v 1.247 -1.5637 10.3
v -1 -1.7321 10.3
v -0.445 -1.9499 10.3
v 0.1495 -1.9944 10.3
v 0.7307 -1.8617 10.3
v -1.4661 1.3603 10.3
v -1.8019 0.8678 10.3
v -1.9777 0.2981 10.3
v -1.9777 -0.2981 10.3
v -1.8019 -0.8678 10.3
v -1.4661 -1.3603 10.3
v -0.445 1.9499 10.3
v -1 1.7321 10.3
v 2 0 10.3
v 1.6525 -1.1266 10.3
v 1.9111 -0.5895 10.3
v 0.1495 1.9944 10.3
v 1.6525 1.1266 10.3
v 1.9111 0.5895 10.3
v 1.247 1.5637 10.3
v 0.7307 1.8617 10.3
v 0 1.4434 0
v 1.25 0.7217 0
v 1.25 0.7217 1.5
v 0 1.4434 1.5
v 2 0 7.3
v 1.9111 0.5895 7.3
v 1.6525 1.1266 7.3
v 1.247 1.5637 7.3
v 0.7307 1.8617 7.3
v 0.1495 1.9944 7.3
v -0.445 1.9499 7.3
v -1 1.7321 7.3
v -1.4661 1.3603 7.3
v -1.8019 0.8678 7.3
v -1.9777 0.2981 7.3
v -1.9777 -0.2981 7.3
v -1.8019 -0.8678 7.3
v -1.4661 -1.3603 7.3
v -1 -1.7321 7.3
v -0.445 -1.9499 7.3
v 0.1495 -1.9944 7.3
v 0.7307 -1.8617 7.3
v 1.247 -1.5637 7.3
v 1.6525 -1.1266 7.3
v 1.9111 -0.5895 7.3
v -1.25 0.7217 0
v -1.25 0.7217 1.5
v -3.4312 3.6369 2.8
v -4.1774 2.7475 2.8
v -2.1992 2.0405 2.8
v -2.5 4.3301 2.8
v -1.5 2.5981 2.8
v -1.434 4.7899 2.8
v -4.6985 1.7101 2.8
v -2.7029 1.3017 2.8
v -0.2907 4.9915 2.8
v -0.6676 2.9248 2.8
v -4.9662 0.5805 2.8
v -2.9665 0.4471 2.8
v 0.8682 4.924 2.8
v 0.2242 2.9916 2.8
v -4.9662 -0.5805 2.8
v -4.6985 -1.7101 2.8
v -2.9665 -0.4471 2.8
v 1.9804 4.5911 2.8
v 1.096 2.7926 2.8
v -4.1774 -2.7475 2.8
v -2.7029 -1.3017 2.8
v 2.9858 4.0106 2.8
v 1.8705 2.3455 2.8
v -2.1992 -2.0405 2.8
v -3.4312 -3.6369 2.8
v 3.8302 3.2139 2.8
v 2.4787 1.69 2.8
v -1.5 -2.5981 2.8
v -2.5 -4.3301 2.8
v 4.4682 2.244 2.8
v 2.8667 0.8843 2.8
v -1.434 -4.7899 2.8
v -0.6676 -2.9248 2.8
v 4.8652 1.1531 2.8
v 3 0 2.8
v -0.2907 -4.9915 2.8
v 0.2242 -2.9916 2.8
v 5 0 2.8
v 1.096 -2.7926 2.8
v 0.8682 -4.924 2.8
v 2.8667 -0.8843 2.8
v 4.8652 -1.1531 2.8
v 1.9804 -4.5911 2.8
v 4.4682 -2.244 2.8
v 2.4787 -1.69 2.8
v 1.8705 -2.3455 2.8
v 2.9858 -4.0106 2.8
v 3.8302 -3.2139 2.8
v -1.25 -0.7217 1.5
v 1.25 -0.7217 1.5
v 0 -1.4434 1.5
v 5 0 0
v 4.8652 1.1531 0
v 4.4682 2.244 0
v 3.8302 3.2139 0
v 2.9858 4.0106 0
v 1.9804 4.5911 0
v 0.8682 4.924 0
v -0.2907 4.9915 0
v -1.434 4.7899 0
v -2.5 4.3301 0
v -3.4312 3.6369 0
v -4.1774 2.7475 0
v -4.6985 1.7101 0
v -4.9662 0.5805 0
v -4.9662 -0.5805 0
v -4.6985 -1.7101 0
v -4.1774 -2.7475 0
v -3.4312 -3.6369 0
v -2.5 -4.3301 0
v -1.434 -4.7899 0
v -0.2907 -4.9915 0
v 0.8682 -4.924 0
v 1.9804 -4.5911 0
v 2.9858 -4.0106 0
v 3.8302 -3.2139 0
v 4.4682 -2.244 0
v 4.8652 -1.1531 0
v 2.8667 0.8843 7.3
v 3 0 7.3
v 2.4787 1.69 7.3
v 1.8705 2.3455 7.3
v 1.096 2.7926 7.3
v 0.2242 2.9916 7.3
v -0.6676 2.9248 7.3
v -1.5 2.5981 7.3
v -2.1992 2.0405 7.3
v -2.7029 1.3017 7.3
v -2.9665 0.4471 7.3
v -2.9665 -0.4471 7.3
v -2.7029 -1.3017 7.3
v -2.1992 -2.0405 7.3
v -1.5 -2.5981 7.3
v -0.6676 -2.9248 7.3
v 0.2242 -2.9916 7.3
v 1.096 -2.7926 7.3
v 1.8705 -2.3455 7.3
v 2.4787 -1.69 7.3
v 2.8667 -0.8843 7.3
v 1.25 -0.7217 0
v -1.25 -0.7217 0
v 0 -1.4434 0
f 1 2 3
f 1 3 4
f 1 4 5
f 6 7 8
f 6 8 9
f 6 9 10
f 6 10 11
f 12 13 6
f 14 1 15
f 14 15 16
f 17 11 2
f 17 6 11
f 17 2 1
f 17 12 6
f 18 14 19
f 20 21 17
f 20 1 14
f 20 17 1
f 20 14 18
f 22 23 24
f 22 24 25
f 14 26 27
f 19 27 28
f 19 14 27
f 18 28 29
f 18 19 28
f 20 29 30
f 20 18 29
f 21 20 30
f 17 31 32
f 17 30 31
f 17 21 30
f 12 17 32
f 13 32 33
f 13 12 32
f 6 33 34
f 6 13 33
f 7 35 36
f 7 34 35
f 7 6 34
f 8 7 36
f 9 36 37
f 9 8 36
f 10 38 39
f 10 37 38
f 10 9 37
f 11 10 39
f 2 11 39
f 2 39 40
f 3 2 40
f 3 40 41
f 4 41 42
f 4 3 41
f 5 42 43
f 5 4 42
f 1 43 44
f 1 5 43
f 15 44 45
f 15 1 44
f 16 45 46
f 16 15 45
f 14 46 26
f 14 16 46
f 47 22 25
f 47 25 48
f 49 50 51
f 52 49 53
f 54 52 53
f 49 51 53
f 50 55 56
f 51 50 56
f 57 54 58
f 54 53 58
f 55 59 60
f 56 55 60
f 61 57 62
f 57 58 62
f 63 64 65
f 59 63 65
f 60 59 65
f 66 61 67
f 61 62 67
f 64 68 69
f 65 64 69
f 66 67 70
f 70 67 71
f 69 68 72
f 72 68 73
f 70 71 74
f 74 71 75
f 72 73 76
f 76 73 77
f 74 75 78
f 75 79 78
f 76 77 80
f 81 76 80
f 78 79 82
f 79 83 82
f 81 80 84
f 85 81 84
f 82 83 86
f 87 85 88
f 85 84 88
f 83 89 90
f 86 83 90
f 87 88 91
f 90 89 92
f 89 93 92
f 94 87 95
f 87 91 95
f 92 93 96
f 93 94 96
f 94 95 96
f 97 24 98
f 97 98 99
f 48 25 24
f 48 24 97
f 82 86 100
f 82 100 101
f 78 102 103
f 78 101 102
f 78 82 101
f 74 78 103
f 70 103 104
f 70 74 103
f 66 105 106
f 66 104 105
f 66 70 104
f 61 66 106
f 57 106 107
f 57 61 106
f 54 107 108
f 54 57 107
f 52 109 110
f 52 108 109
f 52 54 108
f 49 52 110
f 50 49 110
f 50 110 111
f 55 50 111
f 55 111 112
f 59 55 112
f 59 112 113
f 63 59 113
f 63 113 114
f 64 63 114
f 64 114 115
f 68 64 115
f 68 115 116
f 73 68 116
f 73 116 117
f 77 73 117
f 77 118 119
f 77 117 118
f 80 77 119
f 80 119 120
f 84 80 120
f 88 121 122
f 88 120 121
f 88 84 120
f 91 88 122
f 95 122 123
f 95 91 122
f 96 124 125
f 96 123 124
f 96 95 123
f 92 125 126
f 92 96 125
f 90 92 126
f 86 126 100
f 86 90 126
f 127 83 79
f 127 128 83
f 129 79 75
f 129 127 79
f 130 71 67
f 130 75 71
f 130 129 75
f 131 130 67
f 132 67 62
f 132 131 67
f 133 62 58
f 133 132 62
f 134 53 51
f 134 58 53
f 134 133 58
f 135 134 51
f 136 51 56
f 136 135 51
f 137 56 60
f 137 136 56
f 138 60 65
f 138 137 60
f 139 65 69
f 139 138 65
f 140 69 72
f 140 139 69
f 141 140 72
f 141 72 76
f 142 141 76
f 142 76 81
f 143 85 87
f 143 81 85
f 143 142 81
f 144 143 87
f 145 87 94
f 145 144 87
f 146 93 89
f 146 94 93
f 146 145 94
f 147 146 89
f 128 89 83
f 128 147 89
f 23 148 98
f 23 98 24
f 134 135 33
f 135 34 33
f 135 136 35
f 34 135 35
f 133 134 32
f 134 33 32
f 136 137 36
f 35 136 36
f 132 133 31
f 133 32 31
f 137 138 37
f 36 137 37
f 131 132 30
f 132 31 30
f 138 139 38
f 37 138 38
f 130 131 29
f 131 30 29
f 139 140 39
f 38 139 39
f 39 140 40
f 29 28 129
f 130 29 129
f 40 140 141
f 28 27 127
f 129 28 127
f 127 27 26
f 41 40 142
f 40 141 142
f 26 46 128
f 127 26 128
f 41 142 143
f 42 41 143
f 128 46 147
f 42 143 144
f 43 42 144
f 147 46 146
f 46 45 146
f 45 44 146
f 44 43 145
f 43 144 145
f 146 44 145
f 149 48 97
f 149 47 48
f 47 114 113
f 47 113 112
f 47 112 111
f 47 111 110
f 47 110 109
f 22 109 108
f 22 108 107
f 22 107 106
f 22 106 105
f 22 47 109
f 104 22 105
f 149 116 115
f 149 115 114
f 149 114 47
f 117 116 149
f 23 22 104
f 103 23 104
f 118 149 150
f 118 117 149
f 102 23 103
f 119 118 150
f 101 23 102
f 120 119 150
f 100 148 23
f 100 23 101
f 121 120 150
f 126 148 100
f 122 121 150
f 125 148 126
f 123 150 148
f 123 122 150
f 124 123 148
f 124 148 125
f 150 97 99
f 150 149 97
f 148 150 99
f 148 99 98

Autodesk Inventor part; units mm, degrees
ref_plane "YZ Plane" through (0, 0, 0) normal (1, 0, 0) x (0, 1, 0)
ref_plane "XZ Plane" through (0, 0, 0) normal (0, 1, 0) x (-1, 0, 0)
ref_plane "XY Plane" through (0, 0, 0) normal (0, 0, 1) x (1, 0, 0)
sketch "スケッチ1" plane through (0, 0, 0) normal (0, 1, 0) x (-1, 0, 0)
  line L0 (0, 0) -> (-5, 0)
  line L1 (-5, 0) -> (-5, 2.8)
  line L2 (-5, 2.8) -> (-3, 2.8)
  line L3 (-3, 2.8) -> (-3, 7.3)
  line L4 (-3, 7.3) -> (-2, 7.3)
  line L5 (-2, 7.3) -> (-2, 11.87)
  line L6 (-1.57, 12.3) -> (0, 12.3)
  line L7 (0, 12.3) -> (0, 0)
  line L8 (-1.57, 12.3) -> (-2, 11.87)
  point P0 (-2, 12.3)
  dimension "d0" = 5
  dimension "d1" = 4.5
  dimension "d2" = 2.8
  dimension "d3" = 0.43
  dimension "d4" = 0.43
  dimension "d5" = 4
  dimension "d6" = 10
  dimension "d7" = 6
revolve "回転1" add sketch "スケッチ1" angle 360 about axis through (0, 0, 12.3) along (0, 0, -1)
thread "ねじ1" size "M4x0.7" class "6g" standard "ANSI Metric M Profile" length 7.57 offset 1.2
sketch "スケッチ2" plane through (0, 0, 0) normal (0, 0, -1) x (-1, 0, 0)
  line L0 (0, -1.4434) -> (-1.25, -0.7217)
  line L1 (-1.25, -0.7217) -> (-1.25, 0.7217)
  line L2 (-1.25, 0.7217) -> (0, 1.4434)
  line L3 (0, 1.4434) -> (1.25, 0.7217)
  line L4 (1.25, 0.7217) -> (1.25, -0.7217)
  line L5 (1.25, -0.7217) -> (0, -1.4434)
  point P0 (0, 0)
  point P1 (0, 0)
  dimension "d11" = 2.5
extrude "押し出し1" cut sketch "スケッチ2" against normal blind 1.5
sketch "スケッチ3" plane through (0, 0, 12.3) normal (0, 0, 1) x (1, 0, 0)
  circle A0 centre (0, 0) radius 2 projected
extrude "押し出し2" cut sketch "スケッチ3" against normal blind 2
equation "\"d4\" = d3"
properties part number "DBTS4-4.5-5-DHC-LTC_mod" material "ステンレス鋼 AISI 304"
